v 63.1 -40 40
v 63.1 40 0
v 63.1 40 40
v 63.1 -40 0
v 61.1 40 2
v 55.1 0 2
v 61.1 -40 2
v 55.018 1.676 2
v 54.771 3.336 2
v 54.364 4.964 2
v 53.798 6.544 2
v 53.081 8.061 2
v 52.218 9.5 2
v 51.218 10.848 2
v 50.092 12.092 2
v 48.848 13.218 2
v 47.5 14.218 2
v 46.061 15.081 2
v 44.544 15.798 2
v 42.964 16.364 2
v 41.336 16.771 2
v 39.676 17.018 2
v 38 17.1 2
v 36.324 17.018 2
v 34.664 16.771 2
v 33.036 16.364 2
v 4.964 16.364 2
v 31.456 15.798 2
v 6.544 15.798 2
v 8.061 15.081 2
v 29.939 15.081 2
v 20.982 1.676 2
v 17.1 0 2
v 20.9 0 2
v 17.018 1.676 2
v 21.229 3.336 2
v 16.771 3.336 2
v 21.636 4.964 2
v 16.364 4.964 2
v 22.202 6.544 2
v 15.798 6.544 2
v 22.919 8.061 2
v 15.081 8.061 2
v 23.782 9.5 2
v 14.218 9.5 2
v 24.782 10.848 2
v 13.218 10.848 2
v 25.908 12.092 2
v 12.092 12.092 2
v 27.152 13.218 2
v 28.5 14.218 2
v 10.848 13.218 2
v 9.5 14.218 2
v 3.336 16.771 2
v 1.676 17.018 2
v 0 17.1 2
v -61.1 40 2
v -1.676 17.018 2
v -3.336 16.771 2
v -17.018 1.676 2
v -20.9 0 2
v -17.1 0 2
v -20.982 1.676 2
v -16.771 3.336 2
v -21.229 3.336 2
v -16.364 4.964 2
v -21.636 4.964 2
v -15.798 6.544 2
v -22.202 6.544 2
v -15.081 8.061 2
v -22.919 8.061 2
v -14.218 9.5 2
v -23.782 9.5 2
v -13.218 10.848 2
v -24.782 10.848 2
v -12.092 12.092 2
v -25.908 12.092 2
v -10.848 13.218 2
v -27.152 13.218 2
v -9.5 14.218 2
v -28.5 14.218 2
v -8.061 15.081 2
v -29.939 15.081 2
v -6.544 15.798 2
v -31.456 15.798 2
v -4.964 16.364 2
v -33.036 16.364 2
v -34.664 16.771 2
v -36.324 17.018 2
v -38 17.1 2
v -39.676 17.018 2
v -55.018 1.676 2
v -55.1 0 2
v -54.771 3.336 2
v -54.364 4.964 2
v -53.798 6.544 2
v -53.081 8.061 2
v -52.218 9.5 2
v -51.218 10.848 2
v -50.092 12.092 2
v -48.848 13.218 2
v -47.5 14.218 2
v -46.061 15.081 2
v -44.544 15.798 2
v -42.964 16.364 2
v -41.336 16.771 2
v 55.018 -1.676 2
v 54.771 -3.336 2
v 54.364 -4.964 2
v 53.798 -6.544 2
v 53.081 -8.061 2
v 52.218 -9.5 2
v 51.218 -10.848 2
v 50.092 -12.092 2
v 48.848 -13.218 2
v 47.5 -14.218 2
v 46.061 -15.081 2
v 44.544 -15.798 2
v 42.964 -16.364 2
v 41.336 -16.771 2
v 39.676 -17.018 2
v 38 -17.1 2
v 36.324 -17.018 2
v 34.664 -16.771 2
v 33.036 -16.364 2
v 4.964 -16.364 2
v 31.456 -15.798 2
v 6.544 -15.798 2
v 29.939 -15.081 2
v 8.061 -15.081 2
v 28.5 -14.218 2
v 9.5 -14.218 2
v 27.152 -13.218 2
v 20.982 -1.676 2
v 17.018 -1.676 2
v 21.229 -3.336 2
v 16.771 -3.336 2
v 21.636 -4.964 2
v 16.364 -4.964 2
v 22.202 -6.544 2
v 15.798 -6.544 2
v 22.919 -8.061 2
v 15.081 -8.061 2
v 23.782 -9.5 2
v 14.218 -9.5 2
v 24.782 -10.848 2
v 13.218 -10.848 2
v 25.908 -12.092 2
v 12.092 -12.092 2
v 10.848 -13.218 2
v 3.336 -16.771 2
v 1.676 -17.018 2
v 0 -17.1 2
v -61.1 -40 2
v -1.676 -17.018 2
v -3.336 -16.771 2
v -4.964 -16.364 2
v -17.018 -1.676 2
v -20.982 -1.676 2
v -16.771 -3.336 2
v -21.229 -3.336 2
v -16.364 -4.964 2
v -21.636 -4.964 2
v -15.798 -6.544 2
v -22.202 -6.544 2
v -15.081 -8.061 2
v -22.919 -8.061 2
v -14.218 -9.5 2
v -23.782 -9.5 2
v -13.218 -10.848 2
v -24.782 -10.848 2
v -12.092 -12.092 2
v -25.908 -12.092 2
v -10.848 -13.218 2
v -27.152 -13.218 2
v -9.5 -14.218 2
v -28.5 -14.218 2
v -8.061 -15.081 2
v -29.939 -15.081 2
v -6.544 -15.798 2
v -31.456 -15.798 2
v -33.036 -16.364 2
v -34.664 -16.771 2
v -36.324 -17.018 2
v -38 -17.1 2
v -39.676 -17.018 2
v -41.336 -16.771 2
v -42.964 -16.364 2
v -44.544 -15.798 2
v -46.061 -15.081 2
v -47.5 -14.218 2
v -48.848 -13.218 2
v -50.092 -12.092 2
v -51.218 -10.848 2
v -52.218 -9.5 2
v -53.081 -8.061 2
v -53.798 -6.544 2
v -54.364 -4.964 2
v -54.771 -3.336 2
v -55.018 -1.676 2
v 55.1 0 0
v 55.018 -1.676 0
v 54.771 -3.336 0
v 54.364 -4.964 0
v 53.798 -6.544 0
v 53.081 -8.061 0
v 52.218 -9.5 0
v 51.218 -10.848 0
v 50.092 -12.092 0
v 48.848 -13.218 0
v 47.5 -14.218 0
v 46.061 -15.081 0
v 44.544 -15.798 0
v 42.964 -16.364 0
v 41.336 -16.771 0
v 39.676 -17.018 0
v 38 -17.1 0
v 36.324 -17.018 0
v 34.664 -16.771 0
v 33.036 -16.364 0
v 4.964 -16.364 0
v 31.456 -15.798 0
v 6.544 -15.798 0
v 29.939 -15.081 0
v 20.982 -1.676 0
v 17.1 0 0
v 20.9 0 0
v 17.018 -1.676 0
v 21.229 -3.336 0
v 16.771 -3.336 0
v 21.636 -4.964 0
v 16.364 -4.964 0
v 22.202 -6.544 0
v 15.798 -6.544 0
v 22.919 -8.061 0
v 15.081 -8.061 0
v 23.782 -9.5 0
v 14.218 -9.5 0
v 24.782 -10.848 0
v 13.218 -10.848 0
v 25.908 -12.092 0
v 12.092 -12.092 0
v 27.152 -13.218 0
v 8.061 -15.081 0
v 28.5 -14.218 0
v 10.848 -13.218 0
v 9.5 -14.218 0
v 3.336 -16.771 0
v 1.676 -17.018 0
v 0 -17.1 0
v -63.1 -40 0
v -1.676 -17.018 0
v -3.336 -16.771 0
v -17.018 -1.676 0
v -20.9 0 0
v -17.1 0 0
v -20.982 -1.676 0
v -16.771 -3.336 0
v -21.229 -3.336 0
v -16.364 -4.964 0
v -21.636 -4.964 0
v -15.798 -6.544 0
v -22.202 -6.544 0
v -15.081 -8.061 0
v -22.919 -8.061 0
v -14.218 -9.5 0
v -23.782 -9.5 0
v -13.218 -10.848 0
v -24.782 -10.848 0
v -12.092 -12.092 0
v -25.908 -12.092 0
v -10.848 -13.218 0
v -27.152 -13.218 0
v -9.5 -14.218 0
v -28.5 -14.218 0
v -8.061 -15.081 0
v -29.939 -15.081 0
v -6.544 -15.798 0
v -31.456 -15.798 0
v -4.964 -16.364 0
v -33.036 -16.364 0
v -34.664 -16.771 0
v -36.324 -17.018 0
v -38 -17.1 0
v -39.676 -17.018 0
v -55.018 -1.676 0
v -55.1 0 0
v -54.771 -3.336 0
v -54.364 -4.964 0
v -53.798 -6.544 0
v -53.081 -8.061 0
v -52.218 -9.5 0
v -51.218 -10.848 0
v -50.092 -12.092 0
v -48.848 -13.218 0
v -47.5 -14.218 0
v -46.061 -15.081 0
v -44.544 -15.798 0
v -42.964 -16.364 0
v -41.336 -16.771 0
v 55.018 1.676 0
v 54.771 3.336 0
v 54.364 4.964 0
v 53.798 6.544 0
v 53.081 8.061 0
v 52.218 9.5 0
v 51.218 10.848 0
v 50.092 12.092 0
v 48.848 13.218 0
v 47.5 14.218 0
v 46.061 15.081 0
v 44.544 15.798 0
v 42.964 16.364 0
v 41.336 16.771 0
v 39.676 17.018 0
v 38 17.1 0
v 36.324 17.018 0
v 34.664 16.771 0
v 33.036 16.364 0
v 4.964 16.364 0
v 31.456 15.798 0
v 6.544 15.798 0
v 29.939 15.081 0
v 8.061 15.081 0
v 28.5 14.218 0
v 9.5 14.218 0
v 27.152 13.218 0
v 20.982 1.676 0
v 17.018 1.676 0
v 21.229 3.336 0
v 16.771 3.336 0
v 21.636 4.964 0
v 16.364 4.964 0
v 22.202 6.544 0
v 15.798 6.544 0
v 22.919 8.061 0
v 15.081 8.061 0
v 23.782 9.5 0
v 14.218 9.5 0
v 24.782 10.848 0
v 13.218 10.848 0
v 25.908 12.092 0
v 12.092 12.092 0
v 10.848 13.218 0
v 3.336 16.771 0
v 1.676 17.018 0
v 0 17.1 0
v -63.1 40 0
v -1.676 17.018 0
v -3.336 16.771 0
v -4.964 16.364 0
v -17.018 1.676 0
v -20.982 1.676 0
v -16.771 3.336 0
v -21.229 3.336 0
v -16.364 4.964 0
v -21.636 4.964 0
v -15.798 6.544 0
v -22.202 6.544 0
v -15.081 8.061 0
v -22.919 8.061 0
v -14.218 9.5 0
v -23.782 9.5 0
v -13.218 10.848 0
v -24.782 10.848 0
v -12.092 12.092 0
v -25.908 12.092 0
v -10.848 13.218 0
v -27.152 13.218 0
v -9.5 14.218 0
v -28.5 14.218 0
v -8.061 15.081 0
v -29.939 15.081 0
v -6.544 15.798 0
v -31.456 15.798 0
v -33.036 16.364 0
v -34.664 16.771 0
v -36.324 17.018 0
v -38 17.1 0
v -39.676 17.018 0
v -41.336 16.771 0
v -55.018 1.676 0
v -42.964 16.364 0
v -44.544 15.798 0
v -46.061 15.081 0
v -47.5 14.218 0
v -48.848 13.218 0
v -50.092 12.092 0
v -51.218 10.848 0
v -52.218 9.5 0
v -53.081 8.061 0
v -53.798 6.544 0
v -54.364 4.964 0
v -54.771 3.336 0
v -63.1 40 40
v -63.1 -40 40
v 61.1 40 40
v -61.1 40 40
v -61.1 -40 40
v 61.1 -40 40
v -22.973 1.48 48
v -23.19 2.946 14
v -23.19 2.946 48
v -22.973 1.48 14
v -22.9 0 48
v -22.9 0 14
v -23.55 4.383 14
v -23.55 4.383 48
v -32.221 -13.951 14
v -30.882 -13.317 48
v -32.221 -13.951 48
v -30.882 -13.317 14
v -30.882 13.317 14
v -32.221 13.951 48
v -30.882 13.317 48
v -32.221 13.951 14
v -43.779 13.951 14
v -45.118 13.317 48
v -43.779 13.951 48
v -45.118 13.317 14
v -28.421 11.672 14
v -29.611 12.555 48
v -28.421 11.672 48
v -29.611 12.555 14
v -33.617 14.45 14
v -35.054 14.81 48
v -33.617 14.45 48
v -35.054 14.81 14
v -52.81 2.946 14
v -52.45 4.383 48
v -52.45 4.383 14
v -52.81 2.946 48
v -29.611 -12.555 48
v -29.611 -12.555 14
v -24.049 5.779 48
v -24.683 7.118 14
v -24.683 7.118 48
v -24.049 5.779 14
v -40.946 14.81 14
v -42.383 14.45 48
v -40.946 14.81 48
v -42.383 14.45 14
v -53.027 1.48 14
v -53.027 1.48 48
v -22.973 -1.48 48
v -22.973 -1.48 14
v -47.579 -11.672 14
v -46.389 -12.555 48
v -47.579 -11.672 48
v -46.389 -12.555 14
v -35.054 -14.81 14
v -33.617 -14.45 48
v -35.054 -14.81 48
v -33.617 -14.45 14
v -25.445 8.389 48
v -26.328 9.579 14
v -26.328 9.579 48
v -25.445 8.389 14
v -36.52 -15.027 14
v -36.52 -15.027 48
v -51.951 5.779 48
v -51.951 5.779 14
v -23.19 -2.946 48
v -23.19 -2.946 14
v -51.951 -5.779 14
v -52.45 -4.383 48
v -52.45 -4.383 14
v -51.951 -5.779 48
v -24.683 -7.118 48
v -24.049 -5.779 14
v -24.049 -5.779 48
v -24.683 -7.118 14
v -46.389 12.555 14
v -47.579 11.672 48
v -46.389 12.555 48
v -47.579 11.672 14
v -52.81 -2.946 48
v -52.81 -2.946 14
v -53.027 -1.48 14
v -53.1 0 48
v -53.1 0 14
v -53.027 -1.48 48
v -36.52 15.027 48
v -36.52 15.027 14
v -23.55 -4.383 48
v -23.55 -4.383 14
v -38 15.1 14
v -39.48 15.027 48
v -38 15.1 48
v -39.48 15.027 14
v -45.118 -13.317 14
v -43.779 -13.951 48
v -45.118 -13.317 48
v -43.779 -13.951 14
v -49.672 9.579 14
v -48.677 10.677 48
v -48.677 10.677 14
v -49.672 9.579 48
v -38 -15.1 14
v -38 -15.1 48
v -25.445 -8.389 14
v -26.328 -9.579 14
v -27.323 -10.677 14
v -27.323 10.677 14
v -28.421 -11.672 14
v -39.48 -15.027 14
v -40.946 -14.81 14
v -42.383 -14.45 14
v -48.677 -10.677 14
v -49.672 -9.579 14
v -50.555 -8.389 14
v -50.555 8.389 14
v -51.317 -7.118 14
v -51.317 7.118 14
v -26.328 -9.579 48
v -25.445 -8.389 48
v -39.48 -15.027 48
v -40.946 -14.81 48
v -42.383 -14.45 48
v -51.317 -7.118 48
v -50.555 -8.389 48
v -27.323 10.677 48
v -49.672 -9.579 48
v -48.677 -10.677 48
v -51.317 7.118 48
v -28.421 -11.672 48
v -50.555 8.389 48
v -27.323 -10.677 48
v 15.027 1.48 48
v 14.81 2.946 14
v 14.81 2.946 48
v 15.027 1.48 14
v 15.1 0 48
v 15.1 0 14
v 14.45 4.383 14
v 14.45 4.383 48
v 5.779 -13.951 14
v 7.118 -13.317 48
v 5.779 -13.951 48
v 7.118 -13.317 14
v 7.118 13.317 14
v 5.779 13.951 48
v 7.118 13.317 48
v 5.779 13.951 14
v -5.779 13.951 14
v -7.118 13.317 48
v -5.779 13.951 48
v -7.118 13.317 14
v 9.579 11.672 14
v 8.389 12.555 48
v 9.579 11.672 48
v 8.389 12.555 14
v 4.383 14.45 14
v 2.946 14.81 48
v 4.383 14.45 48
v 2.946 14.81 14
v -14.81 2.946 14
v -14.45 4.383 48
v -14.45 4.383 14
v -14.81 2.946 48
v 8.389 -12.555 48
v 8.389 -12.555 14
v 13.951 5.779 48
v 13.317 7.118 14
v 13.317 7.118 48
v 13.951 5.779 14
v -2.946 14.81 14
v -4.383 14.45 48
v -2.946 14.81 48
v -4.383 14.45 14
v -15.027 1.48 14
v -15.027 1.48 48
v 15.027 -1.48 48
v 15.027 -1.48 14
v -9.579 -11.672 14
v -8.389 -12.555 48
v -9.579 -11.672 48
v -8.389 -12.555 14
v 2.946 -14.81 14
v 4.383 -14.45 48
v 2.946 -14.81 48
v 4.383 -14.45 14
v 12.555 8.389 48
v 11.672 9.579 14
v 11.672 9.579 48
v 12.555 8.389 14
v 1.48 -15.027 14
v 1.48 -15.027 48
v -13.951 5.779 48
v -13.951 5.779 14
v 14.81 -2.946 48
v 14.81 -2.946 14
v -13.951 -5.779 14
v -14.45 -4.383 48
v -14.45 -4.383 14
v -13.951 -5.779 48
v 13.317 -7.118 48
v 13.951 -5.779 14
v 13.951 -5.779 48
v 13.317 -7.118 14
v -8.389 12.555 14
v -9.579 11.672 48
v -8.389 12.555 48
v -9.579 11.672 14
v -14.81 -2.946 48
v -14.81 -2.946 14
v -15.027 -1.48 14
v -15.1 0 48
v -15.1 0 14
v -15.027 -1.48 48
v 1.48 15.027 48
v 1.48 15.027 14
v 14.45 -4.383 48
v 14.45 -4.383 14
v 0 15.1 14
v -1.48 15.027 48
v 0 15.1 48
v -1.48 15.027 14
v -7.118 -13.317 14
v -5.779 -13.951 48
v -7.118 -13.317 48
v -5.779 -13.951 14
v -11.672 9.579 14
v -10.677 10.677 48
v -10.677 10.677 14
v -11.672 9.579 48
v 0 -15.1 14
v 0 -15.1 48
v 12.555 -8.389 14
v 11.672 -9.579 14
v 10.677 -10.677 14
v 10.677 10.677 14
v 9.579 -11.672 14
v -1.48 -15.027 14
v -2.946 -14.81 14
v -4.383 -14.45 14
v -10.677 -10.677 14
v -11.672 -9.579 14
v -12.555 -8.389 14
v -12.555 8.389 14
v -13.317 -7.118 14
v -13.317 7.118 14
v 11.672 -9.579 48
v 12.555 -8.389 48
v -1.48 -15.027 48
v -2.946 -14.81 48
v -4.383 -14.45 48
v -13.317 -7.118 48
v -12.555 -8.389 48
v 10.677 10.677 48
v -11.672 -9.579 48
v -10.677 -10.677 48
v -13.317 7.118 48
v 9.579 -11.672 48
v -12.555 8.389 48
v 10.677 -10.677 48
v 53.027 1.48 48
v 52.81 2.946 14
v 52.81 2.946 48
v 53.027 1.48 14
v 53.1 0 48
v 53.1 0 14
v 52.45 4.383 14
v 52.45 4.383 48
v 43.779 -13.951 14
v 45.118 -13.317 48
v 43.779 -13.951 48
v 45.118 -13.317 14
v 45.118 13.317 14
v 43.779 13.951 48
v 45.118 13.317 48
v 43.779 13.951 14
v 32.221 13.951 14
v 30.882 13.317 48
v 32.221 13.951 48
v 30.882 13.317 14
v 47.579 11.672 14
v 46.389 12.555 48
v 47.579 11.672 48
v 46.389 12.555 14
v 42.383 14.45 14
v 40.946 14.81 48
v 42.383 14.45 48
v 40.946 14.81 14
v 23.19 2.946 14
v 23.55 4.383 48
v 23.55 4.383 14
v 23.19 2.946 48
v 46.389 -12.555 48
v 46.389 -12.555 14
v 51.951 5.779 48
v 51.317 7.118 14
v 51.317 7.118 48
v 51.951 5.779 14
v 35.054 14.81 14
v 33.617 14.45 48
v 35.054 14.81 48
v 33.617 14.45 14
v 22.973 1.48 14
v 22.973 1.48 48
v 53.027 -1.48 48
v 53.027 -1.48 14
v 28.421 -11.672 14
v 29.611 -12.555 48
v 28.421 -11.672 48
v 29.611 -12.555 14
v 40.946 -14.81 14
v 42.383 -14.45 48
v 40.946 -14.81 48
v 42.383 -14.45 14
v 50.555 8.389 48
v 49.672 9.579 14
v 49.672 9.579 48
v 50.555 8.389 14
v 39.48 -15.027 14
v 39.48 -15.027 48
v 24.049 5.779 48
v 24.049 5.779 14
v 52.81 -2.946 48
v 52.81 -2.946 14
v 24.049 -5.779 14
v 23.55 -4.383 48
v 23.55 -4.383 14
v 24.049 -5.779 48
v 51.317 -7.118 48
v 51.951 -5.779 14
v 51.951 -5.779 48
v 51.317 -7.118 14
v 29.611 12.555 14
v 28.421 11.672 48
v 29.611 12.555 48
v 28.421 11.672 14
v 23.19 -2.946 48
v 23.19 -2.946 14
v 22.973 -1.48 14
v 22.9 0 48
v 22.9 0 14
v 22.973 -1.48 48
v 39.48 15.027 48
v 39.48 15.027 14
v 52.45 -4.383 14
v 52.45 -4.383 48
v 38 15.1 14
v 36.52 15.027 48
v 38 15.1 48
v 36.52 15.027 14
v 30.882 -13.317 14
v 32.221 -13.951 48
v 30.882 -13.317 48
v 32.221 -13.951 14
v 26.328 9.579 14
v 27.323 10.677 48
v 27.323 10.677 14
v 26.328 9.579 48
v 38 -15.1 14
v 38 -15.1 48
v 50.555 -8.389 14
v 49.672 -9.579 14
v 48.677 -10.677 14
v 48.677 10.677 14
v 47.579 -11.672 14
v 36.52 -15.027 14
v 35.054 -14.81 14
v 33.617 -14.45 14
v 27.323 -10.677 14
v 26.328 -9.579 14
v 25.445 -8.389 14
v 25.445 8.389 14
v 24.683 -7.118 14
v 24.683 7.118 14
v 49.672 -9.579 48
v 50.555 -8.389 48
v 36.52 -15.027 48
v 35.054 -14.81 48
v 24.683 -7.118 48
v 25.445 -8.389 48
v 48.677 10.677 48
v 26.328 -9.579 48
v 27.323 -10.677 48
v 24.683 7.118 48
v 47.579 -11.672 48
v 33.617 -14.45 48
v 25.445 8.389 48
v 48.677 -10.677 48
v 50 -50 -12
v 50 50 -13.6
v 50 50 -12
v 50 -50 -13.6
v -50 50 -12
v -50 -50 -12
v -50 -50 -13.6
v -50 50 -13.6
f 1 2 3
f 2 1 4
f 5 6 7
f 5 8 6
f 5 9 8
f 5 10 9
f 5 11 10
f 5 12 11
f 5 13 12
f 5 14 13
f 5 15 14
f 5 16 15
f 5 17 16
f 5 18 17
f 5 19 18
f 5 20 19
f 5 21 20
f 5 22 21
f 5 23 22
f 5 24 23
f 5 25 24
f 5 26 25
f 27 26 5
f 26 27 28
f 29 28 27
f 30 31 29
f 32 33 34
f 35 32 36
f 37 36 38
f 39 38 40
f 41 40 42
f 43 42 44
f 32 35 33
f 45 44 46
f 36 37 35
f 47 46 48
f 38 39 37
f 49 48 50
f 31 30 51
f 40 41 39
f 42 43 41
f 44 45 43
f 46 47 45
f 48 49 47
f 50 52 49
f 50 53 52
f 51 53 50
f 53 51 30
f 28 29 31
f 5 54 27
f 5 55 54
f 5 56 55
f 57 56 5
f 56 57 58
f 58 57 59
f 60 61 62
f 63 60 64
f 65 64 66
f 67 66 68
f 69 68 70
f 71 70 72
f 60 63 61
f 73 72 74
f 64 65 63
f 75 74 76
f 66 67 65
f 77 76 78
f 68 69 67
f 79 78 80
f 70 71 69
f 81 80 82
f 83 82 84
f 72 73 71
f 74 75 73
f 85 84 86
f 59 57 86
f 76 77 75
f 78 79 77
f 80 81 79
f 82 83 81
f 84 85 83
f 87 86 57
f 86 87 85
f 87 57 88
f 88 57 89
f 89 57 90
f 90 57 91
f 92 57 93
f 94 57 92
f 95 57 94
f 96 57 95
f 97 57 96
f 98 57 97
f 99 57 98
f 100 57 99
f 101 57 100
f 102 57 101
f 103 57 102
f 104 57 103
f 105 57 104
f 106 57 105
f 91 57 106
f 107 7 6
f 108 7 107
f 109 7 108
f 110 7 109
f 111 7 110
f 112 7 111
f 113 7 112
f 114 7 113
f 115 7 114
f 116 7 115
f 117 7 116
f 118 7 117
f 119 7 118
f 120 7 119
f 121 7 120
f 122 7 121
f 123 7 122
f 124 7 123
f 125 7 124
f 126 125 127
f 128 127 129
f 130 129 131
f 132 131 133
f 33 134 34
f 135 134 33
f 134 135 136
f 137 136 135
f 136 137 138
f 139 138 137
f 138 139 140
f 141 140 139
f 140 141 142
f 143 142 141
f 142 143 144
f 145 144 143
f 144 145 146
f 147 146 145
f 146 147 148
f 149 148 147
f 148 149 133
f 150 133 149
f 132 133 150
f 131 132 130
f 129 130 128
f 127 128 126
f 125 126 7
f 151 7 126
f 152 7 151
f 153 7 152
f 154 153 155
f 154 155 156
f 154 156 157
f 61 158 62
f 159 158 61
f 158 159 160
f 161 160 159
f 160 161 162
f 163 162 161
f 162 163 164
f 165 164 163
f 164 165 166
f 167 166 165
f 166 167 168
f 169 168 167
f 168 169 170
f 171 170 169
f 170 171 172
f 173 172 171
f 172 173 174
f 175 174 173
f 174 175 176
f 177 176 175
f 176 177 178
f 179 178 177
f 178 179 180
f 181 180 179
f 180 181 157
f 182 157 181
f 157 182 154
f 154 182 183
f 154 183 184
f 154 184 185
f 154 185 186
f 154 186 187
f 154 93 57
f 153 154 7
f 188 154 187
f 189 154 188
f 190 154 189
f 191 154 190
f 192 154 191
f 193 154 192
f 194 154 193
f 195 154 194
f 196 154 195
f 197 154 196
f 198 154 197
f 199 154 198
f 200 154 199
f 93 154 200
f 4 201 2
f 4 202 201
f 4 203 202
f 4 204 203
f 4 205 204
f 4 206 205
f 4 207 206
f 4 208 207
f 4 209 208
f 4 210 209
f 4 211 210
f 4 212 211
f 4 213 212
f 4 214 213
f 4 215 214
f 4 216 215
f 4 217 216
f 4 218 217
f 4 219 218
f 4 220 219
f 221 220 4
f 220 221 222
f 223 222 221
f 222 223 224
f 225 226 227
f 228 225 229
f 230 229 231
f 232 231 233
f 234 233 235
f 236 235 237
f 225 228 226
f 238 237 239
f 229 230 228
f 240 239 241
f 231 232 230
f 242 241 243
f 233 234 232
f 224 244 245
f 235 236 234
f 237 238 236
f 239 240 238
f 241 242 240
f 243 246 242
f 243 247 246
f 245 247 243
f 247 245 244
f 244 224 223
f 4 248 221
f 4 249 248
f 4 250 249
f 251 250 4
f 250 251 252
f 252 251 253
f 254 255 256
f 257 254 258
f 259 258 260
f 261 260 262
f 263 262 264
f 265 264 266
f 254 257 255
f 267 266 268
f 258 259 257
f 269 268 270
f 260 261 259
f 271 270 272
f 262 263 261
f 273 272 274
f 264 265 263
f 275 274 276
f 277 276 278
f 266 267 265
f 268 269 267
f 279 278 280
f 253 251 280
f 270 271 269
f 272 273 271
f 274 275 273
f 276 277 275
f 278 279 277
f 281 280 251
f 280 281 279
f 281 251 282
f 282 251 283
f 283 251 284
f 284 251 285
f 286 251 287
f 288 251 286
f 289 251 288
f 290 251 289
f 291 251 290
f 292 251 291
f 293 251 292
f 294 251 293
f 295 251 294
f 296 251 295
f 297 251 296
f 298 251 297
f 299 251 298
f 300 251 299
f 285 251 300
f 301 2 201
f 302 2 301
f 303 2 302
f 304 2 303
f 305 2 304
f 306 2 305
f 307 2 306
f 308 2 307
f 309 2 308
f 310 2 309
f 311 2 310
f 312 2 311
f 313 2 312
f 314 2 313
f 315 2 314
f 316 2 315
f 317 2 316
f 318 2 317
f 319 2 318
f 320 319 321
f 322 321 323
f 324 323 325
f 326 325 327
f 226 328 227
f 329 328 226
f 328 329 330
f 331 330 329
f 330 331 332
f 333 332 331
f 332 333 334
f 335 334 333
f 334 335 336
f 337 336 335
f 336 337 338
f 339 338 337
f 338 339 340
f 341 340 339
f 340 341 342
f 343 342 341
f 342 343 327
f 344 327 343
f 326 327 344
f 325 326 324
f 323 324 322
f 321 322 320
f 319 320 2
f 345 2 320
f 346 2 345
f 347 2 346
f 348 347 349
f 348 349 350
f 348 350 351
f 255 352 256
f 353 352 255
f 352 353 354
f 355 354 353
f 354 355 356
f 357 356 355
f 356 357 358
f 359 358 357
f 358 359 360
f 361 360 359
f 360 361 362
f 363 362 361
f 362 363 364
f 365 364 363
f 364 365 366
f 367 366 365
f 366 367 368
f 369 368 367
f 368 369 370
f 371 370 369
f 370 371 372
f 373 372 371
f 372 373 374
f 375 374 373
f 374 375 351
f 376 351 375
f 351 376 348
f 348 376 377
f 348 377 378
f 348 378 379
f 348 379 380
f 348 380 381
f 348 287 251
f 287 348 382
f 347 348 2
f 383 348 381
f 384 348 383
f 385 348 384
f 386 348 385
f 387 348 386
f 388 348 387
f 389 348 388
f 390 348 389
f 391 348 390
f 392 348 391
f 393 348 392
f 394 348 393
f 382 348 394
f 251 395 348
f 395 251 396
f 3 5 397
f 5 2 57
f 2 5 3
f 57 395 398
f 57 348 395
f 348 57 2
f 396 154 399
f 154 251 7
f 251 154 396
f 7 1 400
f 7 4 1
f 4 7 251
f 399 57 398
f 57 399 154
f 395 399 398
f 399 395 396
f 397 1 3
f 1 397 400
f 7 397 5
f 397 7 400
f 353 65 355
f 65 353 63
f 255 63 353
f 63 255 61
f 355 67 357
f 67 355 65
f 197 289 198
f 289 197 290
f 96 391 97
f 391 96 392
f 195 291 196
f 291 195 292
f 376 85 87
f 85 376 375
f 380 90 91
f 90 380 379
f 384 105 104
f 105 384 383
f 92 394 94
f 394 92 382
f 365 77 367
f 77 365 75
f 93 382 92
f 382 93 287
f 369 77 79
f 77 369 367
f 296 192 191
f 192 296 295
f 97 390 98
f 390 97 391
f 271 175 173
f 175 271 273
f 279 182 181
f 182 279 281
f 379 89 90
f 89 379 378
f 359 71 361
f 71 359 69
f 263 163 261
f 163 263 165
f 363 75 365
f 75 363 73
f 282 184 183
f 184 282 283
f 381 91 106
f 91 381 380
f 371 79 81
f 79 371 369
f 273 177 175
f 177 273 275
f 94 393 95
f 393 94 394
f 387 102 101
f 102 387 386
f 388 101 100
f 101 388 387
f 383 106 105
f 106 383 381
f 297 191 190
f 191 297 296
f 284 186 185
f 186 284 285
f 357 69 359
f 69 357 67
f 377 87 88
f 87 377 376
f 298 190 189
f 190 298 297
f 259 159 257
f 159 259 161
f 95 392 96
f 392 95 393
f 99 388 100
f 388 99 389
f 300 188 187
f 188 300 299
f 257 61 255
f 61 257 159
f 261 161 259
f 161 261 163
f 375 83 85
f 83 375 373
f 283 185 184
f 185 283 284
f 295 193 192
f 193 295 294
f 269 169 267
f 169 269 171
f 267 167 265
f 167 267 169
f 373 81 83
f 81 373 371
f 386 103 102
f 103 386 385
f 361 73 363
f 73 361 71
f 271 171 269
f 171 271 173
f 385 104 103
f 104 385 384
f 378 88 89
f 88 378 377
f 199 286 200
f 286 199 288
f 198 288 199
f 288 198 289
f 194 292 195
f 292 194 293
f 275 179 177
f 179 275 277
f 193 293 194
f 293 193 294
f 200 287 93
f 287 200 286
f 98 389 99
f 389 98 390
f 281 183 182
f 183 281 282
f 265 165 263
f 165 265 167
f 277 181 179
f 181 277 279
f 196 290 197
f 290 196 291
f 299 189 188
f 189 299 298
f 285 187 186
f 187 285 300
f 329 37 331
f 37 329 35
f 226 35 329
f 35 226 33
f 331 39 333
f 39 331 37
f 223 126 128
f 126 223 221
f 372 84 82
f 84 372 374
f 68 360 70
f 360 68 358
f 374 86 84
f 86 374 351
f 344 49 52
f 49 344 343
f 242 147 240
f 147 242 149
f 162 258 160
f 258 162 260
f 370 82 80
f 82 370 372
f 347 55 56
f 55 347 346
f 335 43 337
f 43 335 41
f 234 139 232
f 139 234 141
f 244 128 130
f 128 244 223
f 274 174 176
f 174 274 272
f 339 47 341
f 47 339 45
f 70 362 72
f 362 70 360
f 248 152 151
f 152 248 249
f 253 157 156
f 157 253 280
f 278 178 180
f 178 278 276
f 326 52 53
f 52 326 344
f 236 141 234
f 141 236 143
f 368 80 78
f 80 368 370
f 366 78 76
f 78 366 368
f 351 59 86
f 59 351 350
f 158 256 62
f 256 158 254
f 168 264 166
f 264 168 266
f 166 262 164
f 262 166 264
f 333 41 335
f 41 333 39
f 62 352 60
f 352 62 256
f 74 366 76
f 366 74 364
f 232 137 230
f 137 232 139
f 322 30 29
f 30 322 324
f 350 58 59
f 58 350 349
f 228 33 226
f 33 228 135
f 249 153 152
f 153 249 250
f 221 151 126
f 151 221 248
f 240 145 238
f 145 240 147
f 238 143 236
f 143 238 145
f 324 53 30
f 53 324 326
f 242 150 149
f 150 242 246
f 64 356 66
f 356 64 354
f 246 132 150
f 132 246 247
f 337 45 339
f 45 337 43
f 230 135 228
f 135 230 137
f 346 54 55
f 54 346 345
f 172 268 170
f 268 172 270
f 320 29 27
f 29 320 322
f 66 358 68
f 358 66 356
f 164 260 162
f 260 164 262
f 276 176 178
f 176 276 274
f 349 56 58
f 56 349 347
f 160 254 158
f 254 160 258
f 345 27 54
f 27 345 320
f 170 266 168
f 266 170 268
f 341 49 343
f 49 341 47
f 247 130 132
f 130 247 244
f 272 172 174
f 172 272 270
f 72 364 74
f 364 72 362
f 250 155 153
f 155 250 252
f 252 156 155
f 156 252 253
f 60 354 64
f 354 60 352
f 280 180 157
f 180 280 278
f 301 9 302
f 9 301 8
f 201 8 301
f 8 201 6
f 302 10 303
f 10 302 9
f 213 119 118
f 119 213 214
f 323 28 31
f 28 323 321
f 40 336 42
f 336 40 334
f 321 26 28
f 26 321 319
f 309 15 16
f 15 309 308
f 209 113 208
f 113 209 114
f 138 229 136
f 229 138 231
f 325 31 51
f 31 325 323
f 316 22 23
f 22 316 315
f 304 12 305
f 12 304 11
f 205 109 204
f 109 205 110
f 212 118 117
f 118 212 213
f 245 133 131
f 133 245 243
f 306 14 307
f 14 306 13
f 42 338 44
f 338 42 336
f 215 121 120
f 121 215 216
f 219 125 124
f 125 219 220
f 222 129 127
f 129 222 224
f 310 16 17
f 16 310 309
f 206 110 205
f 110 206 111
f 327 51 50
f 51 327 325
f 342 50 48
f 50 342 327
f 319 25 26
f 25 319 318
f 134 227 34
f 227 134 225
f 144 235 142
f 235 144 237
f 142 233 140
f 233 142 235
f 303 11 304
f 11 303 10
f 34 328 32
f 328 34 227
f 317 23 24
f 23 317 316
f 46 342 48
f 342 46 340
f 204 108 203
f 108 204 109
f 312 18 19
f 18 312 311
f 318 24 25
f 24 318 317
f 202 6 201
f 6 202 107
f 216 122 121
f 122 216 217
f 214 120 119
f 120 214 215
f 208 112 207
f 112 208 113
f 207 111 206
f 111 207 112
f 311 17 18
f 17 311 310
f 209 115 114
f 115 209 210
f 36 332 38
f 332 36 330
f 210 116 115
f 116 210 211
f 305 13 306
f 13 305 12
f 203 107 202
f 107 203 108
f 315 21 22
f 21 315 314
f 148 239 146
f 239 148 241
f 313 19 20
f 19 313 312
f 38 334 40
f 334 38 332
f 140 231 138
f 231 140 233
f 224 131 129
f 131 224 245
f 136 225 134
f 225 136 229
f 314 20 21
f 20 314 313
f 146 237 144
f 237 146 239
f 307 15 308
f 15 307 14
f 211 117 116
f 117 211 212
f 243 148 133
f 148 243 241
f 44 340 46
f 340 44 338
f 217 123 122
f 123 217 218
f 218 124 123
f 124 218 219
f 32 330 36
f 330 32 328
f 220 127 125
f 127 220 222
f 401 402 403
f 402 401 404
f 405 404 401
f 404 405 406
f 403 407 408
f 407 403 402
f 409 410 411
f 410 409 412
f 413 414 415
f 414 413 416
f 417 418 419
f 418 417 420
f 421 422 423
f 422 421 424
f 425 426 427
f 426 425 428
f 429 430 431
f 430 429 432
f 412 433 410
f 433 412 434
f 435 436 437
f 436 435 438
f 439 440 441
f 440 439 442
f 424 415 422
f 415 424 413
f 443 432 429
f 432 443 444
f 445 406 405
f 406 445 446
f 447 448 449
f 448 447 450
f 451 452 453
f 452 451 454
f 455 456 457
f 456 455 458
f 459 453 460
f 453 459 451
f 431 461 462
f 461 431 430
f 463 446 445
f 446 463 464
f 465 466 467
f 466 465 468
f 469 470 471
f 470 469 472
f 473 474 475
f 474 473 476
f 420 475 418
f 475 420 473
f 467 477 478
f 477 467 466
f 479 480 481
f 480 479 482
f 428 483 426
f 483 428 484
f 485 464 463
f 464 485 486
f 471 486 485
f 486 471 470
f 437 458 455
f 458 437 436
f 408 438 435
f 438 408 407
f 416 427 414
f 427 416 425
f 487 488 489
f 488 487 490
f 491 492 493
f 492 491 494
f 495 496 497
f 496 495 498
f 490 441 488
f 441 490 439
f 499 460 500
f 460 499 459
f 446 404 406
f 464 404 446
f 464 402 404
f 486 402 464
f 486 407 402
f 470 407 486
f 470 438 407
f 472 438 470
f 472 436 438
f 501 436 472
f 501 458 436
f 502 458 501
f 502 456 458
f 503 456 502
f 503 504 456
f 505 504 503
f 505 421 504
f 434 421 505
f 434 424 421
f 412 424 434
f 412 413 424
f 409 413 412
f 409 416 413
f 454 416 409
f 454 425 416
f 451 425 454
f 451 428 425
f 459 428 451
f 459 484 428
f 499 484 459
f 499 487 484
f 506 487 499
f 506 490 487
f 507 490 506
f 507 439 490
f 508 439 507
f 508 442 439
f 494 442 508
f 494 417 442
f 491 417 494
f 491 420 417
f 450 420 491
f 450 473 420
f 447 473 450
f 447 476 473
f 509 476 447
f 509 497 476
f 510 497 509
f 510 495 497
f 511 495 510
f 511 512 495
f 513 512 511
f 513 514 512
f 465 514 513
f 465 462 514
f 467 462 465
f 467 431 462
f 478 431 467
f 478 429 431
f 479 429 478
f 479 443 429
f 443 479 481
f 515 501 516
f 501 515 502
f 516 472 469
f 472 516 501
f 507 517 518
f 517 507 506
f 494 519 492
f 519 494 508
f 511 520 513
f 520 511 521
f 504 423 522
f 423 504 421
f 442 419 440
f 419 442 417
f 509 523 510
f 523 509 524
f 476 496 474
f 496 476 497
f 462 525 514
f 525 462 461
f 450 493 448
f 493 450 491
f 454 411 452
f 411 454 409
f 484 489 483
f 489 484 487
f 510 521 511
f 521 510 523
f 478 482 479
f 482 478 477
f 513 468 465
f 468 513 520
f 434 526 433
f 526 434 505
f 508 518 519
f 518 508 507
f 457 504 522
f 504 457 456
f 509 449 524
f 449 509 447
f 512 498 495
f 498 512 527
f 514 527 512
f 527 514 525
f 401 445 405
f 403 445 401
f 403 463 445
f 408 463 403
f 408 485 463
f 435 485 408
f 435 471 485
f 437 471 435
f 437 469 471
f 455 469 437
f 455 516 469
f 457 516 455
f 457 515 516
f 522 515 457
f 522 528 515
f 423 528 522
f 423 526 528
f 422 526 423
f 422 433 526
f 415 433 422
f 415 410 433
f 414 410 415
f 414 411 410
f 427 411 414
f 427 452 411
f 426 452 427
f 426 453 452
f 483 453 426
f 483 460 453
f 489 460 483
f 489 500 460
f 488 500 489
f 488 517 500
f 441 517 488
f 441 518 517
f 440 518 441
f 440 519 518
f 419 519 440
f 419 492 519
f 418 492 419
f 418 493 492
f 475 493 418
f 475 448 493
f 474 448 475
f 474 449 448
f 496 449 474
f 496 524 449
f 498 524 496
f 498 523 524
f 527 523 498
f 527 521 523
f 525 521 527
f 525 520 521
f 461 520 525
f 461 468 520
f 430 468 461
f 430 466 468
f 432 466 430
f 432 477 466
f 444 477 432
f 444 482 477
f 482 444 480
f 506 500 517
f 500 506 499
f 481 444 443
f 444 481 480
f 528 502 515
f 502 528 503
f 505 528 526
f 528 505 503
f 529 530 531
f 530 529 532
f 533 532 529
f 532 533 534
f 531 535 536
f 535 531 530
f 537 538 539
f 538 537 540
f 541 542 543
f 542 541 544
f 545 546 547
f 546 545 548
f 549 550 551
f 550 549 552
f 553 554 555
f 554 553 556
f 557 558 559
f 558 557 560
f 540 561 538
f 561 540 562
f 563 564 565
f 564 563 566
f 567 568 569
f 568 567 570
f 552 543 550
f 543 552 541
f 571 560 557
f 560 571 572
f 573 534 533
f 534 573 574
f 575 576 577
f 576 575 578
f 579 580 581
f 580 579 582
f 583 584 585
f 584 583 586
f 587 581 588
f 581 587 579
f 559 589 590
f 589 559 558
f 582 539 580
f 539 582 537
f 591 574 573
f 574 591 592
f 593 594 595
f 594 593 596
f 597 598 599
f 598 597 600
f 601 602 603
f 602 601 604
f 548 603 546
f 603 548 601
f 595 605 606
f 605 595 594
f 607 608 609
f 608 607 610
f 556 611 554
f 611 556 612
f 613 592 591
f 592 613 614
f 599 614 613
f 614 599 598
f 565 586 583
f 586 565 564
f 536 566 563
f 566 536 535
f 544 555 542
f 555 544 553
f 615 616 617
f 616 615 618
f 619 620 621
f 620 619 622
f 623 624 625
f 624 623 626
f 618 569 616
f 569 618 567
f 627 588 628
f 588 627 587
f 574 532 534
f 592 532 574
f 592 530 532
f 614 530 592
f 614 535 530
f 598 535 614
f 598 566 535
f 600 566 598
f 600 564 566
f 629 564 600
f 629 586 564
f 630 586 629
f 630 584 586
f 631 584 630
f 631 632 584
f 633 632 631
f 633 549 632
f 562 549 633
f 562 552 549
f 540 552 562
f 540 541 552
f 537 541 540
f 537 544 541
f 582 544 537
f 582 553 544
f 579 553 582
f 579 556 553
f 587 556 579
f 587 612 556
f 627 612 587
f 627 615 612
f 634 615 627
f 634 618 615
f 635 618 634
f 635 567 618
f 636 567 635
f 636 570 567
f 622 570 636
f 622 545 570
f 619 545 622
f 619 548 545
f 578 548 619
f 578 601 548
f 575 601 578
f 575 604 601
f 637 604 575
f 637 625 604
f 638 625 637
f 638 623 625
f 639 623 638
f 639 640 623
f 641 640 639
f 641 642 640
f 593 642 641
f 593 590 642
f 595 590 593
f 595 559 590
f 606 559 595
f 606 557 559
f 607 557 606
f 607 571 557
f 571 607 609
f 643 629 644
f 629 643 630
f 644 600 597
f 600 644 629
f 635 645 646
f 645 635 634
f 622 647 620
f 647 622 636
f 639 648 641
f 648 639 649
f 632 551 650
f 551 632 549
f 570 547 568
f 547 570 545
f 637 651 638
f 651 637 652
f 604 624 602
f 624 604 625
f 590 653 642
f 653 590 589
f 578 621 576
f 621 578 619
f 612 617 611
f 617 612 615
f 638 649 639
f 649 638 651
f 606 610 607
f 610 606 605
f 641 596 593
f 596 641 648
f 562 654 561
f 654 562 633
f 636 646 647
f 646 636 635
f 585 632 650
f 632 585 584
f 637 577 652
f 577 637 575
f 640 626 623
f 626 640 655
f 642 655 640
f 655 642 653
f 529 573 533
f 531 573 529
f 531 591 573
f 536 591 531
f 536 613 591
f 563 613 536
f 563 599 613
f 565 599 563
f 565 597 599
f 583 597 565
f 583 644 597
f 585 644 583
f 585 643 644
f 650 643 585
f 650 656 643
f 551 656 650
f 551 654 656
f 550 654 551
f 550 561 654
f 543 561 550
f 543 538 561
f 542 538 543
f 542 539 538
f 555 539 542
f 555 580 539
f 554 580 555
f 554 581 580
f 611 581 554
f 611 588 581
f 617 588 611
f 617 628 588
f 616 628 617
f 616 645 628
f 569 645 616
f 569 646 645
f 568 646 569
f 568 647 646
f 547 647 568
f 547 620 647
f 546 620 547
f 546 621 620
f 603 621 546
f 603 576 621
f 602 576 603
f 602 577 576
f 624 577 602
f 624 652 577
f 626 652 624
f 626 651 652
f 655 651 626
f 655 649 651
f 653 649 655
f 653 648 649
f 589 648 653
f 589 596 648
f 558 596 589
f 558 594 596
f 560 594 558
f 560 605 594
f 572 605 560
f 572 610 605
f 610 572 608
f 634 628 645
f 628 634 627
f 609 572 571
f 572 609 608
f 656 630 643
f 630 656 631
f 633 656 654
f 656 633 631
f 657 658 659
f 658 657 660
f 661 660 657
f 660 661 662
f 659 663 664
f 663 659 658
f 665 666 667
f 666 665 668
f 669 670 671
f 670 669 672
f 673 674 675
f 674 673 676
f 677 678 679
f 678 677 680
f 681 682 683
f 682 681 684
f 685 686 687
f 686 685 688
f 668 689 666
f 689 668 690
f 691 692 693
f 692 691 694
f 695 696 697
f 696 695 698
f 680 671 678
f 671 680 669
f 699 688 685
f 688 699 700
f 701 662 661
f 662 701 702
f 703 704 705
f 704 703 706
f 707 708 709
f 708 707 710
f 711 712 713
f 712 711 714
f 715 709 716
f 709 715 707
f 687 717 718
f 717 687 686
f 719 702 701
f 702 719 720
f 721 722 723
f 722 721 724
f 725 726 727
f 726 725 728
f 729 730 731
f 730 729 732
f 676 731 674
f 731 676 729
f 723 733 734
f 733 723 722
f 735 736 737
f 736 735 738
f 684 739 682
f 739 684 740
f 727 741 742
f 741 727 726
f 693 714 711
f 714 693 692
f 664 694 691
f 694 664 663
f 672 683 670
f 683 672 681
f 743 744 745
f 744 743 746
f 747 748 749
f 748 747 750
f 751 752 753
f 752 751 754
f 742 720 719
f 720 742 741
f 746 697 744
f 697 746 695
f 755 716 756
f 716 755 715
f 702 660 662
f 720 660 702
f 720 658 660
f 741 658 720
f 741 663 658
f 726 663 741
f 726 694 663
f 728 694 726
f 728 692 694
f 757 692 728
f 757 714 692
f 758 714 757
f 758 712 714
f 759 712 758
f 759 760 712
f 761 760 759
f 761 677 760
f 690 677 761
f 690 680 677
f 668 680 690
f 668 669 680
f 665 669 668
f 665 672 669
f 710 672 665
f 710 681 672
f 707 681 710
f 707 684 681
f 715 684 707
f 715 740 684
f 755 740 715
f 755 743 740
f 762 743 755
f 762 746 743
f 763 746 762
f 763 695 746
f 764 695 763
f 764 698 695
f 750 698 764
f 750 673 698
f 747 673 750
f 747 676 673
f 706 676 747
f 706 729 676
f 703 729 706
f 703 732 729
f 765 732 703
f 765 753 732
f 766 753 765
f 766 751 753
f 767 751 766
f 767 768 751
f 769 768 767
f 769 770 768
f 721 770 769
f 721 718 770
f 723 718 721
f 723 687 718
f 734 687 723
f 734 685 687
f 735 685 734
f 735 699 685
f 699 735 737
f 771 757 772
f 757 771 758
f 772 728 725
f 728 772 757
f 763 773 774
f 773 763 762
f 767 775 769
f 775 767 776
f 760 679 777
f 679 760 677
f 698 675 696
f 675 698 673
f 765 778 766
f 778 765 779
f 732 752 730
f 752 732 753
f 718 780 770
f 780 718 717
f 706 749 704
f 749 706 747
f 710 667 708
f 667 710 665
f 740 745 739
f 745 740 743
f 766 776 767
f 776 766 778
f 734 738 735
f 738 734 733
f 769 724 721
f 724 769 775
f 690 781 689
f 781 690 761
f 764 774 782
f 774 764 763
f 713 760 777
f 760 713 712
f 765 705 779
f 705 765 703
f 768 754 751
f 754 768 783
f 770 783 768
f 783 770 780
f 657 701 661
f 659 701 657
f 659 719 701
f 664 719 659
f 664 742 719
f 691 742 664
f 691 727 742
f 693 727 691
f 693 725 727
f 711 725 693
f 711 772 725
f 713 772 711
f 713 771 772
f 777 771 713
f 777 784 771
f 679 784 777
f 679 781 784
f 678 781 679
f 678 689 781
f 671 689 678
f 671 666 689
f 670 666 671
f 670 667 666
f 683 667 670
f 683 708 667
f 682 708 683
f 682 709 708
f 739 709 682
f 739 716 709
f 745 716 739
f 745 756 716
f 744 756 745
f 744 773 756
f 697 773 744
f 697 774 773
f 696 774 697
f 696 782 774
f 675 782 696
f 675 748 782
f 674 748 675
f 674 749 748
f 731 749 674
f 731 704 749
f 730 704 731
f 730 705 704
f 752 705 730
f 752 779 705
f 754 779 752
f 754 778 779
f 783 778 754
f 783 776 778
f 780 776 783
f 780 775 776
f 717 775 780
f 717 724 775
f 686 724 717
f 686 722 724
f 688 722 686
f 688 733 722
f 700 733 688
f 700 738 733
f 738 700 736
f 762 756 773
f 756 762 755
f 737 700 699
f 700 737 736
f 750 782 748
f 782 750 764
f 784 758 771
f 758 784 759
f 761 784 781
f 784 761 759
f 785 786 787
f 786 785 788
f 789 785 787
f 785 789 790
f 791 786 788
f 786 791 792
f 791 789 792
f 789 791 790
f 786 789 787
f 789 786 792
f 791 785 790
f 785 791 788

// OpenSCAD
// QS30-9 REV.A9 — 三位显示模块（方案 B：独立金属管座支架 + 背置驱动 PCB）
// 参数化 OpenSCAD；所有尺寸来自 cad/QS30_parameters.json，H03 实测后改参数即可重建。
// 状态：PROVISIONAL，未在 CAD 中打开验证；不得据此加工。
tube_dia = 30.2;
tube_h = 34.0;
panel_t = 2.0;
pcb_t = 1.6;
standoff = 12.0;
pcb_w = 100.0;
pcb_h = 100.0;
socket_pitch = 38;   // TBD：H03 实测前用 38 mm 占位（禁止用于加工）
module_w = socket_pitch * 2 + tube_dia + 20;

module tube(i) {
  translate([i * socket_pitch, 0, panel_t + standoff])
    cylinder(d = tube_dia, h = tube_h, $fn = 64);
}
module metal_bracket() {
  // 金属承力支架（M1/M2 待定），仅示意：底部托板 + 两侧折边
  color("silver") difference() {
    union() {
      translate([-module_w/2, -40, 0]) cube([module_w, 80, 2]);
      translate([-module_w/2, -40, 0]) cube([2, 80, 40]);
      translate([module_w/2 - 2, -40, 0]) cube([2, 80, 40]);
    }
    for (i = [-1, 0, 1]) translate([i * socket_pitch, 0, -1])
      cylinder(d = tube_dia + 4, h = 60, $fn = 64);
  }
}
module pcb() {
  color("darkgreen") translate([-pcb_w/2, -pcb_h/2, -standoff - pcb_t])
    cube([pcb_w, pcb_h, pcb_t]);
}
module module_3tube() {
  metal_bracket();
  for (i = [-1, 0, 1]) tube(i);
  pcb();
}
module_3tube();
